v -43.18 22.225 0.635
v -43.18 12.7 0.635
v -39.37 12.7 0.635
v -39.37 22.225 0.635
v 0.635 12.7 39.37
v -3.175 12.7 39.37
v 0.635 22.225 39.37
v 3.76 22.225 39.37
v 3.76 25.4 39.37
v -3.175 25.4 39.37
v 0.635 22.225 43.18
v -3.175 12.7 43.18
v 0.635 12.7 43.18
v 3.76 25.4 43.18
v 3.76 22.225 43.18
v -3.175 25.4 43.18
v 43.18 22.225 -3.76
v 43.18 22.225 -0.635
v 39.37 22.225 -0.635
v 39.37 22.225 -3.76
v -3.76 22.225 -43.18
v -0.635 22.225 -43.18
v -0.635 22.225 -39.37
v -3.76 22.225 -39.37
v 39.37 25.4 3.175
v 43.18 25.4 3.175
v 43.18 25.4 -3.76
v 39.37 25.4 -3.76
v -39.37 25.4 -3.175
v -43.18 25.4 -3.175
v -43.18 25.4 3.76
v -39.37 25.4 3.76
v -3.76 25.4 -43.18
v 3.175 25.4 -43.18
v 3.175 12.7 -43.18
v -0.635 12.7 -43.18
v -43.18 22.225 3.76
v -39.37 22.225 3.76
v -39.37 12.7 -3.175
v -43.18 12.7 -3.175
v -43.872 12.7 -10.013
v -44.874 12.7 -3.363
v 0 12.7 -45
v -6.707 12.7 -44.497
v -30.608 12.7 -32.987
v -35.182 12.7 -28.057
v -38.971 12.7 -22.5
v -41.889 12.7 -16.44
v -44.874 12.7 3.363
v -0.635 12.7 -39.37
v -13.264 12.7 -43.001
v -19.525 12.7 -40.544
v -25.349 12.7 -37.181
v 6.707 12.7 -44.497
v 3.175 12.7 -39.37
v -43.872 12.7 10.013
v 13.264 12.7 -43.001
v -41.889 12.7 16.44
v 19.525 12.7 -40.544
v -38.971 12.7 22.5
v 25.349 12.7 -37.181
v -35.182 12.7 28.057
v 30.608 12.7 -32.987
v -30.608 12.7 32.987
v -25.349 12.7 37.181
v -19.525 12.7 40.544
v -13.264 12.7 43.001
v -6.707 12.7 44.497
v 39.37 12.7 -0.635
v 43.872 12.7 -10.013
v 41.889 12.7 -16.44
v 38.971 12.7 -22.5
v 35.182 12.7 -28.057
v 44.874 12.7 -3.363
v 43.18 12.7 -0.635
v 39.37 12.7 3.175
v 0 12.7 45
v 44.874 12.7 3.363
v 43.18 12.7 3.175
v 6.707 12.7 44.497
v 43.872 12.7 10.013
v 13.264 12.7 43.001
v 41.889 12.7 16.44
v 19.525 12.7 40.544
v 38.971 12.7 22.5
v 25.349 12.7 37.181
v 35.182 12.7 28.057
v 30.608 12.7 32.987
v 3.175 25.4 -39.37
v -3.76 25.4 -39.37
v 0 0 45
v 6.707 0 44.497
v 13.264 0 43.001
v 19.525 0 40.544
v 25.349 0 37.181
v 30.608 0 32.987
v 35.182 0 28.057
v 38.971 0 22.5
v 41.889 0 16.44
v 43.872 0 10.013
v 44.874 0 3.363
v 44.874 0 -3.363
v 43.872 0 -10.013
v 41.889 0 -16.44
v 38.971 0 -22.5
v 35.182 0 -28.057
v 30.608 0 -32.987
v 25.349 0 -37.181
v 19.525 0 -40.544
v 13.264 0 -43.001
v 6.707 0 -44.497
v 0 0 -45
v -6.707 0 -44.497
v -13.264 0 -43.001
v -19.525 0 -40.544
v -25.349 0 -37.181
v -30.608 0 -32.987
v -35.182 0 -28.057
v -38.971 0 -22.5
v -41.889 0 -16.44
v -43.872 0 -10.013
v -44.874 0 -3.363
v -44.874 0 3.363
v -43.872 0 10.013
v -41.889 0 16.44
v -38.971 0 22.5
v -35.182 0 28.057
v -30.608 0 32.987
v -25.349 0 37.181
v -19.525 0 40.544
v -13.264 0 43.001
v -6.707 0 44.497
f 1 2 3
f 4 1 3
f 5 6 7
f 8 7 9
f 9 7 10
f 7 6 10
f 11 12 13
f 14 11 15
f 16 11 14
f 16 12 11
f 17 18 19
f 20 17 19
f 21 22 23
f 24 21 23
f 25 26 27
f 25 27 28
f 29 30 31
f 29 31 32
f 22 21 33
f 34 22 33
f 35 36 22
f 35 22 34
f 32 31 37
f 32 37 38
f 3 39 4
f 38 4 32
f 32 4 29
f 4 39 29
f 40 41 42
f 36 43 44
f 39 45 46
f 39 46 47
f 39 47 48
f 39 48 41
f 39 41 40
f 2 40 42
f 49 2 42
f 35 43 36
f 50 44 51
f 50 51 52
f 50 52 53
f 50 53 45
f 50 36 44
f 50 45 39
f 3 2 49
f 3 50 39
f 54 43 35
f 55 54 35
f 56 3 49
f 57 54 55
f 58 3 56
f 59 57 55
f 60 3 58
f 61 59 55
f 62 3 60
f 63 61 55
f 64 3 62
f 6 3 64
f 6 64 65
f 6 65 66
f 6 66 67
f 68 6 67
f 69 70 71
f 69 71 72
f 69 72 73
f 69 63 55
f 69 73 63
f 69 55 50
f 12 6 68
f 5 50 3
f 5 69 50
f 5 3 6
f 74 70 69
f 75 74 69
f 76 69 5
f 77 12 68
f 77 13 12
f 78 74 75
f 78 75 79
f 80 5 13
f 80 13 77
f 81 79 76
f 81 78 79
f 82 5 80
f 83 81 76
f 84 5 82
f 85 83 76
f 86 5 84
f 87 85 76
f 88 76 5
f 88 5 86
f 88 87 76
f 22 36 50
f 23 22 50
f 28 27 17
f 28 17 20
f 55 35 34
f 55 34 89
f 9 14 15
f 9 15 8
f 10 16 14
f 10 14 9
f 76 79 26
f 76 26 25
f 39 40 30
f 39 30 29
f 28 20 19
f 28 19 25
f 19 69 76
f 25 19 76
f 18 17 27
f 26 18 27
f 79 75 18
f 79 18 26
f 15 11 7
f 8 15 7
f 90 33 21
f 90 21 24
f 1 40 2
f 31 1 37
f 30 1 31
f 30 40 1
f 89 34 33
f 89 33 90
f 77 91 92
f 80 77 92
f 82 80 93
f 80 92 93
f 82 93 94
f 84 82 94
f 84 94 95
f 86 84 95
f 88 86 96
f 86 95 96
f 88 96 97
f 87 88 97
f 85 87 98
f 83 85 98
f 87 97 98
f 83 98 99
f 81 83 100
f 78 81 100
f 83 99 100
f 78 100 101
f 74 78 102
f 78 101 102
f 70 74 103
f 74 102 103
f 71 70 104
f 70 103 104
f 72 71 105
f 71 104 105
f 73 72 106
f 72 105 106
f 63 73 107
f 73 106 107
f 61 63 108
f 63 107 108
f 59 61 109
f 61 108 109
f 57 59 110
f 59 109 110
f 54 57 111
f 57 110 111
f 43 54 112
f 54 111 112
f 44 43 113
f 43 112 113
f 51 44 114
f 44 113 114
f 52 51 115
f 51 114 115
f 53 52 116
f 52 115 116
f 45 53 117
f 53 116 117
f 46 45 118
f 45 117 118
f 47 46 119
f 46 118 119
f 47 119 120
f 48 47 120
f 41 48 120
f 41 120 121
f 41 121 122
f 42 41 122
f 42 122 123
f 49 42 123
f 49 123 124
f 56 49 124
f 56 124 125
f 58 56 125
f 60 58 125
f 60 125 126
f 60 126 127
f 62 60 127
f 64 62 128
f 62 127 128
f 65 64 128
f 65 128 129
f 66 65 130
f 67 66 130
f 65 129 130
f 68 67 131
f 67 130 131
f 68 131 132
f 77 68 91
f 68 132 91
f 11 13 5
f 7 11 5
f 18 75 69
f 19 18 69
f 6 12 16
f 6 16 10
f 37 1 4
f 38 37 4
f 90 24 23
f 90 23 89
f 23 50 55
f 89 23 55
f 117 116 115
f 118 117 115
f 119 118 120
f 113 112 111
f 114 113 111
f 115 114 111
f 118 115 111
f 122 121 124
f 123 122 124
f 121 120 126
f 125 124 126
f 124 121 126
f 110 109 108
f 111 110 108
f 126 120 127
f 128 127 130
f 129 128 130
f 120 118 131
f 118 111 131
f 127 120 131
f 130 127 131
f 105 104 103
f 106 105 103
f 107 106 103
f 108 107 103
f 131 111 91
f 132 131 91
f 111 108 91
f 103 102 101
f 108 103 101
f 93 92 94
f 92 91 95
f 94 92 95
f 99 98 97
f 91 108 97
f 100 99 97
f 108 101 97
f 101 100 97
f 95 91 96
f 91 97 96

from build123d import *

# Parameters (mm, degrees)
SKETCH1_R           = 45
BOSS_EXTRUDE1_DEPTH = 12.7
SKETCH2_W           = 3.81
SKETCH2_H           = 3.81
BOSS_EXTRUDE2_DEPTH = 12.7
SKETCH3_W           = 3.81
SKETCH3_H           = 3.175
BOSS_EXTRUDE3_DEPTH = 3.125
CIRPATTERN2_COUNT   = 4


with BuildPart() as part:
    # Sketch1 → Boss-Extrude1 (new body)
    with BuildSketch(Plane(origin=(0, 0, 0), x_dir=(1, 0, 0), z_dir=(0, 1, 0))):
        with Locations(Location((0, 0, 0), (0, 0, 270))):
            Circle(SKETCH1_R)
    extrude(amount=BOSS_EXTRUDE1_DEPTH)

    # Sketch2 → Boss-Extrude2 (add)
    with BuildSketch(Plane(origin=(0, 12.7, 0), x_dir=(1, 0, 0), z_dir=(0, 1, 0))):
        with Locations((-41.275, 1.27)):
            Rectangle(SKETCH2_W, SKETCH2_H)
    boss_extrude2 = extrude(amount=BOSS_EXTRUDE2_DEPTH)

    # Sketch3 → Boss-Extrude3 (add)
    with BuildSketch(Plane.XY.offset(0.635)):
        with Locations((-41.275, 23.8125)):
            Rectangle(SKETCH3_W, SKETCH3_H)
    boss_extrude3 = extrude(amount=BOSS_EXTRUDE3_DEPTH)

    # CirPattern2: Boss-Extrude2, Boss-Extrude3 ×4 about axis
    cirpattern2_axis = Axis((0, 0, 0), (0, 1, 0))
    add([boss_extrude2.rotate(cirpattern2_axis, i * 360 / CIRPATTERN2_COUNT) for i in range(1, CIRPATTERN2_COUNT)])
    add([boss_extrude3.rotate(cirpattern2_axis, i * 360 / CIRPATTERN2_COUNT) for i in range(1, CIRPATTERN2_COUNT)])


solid = part.part
